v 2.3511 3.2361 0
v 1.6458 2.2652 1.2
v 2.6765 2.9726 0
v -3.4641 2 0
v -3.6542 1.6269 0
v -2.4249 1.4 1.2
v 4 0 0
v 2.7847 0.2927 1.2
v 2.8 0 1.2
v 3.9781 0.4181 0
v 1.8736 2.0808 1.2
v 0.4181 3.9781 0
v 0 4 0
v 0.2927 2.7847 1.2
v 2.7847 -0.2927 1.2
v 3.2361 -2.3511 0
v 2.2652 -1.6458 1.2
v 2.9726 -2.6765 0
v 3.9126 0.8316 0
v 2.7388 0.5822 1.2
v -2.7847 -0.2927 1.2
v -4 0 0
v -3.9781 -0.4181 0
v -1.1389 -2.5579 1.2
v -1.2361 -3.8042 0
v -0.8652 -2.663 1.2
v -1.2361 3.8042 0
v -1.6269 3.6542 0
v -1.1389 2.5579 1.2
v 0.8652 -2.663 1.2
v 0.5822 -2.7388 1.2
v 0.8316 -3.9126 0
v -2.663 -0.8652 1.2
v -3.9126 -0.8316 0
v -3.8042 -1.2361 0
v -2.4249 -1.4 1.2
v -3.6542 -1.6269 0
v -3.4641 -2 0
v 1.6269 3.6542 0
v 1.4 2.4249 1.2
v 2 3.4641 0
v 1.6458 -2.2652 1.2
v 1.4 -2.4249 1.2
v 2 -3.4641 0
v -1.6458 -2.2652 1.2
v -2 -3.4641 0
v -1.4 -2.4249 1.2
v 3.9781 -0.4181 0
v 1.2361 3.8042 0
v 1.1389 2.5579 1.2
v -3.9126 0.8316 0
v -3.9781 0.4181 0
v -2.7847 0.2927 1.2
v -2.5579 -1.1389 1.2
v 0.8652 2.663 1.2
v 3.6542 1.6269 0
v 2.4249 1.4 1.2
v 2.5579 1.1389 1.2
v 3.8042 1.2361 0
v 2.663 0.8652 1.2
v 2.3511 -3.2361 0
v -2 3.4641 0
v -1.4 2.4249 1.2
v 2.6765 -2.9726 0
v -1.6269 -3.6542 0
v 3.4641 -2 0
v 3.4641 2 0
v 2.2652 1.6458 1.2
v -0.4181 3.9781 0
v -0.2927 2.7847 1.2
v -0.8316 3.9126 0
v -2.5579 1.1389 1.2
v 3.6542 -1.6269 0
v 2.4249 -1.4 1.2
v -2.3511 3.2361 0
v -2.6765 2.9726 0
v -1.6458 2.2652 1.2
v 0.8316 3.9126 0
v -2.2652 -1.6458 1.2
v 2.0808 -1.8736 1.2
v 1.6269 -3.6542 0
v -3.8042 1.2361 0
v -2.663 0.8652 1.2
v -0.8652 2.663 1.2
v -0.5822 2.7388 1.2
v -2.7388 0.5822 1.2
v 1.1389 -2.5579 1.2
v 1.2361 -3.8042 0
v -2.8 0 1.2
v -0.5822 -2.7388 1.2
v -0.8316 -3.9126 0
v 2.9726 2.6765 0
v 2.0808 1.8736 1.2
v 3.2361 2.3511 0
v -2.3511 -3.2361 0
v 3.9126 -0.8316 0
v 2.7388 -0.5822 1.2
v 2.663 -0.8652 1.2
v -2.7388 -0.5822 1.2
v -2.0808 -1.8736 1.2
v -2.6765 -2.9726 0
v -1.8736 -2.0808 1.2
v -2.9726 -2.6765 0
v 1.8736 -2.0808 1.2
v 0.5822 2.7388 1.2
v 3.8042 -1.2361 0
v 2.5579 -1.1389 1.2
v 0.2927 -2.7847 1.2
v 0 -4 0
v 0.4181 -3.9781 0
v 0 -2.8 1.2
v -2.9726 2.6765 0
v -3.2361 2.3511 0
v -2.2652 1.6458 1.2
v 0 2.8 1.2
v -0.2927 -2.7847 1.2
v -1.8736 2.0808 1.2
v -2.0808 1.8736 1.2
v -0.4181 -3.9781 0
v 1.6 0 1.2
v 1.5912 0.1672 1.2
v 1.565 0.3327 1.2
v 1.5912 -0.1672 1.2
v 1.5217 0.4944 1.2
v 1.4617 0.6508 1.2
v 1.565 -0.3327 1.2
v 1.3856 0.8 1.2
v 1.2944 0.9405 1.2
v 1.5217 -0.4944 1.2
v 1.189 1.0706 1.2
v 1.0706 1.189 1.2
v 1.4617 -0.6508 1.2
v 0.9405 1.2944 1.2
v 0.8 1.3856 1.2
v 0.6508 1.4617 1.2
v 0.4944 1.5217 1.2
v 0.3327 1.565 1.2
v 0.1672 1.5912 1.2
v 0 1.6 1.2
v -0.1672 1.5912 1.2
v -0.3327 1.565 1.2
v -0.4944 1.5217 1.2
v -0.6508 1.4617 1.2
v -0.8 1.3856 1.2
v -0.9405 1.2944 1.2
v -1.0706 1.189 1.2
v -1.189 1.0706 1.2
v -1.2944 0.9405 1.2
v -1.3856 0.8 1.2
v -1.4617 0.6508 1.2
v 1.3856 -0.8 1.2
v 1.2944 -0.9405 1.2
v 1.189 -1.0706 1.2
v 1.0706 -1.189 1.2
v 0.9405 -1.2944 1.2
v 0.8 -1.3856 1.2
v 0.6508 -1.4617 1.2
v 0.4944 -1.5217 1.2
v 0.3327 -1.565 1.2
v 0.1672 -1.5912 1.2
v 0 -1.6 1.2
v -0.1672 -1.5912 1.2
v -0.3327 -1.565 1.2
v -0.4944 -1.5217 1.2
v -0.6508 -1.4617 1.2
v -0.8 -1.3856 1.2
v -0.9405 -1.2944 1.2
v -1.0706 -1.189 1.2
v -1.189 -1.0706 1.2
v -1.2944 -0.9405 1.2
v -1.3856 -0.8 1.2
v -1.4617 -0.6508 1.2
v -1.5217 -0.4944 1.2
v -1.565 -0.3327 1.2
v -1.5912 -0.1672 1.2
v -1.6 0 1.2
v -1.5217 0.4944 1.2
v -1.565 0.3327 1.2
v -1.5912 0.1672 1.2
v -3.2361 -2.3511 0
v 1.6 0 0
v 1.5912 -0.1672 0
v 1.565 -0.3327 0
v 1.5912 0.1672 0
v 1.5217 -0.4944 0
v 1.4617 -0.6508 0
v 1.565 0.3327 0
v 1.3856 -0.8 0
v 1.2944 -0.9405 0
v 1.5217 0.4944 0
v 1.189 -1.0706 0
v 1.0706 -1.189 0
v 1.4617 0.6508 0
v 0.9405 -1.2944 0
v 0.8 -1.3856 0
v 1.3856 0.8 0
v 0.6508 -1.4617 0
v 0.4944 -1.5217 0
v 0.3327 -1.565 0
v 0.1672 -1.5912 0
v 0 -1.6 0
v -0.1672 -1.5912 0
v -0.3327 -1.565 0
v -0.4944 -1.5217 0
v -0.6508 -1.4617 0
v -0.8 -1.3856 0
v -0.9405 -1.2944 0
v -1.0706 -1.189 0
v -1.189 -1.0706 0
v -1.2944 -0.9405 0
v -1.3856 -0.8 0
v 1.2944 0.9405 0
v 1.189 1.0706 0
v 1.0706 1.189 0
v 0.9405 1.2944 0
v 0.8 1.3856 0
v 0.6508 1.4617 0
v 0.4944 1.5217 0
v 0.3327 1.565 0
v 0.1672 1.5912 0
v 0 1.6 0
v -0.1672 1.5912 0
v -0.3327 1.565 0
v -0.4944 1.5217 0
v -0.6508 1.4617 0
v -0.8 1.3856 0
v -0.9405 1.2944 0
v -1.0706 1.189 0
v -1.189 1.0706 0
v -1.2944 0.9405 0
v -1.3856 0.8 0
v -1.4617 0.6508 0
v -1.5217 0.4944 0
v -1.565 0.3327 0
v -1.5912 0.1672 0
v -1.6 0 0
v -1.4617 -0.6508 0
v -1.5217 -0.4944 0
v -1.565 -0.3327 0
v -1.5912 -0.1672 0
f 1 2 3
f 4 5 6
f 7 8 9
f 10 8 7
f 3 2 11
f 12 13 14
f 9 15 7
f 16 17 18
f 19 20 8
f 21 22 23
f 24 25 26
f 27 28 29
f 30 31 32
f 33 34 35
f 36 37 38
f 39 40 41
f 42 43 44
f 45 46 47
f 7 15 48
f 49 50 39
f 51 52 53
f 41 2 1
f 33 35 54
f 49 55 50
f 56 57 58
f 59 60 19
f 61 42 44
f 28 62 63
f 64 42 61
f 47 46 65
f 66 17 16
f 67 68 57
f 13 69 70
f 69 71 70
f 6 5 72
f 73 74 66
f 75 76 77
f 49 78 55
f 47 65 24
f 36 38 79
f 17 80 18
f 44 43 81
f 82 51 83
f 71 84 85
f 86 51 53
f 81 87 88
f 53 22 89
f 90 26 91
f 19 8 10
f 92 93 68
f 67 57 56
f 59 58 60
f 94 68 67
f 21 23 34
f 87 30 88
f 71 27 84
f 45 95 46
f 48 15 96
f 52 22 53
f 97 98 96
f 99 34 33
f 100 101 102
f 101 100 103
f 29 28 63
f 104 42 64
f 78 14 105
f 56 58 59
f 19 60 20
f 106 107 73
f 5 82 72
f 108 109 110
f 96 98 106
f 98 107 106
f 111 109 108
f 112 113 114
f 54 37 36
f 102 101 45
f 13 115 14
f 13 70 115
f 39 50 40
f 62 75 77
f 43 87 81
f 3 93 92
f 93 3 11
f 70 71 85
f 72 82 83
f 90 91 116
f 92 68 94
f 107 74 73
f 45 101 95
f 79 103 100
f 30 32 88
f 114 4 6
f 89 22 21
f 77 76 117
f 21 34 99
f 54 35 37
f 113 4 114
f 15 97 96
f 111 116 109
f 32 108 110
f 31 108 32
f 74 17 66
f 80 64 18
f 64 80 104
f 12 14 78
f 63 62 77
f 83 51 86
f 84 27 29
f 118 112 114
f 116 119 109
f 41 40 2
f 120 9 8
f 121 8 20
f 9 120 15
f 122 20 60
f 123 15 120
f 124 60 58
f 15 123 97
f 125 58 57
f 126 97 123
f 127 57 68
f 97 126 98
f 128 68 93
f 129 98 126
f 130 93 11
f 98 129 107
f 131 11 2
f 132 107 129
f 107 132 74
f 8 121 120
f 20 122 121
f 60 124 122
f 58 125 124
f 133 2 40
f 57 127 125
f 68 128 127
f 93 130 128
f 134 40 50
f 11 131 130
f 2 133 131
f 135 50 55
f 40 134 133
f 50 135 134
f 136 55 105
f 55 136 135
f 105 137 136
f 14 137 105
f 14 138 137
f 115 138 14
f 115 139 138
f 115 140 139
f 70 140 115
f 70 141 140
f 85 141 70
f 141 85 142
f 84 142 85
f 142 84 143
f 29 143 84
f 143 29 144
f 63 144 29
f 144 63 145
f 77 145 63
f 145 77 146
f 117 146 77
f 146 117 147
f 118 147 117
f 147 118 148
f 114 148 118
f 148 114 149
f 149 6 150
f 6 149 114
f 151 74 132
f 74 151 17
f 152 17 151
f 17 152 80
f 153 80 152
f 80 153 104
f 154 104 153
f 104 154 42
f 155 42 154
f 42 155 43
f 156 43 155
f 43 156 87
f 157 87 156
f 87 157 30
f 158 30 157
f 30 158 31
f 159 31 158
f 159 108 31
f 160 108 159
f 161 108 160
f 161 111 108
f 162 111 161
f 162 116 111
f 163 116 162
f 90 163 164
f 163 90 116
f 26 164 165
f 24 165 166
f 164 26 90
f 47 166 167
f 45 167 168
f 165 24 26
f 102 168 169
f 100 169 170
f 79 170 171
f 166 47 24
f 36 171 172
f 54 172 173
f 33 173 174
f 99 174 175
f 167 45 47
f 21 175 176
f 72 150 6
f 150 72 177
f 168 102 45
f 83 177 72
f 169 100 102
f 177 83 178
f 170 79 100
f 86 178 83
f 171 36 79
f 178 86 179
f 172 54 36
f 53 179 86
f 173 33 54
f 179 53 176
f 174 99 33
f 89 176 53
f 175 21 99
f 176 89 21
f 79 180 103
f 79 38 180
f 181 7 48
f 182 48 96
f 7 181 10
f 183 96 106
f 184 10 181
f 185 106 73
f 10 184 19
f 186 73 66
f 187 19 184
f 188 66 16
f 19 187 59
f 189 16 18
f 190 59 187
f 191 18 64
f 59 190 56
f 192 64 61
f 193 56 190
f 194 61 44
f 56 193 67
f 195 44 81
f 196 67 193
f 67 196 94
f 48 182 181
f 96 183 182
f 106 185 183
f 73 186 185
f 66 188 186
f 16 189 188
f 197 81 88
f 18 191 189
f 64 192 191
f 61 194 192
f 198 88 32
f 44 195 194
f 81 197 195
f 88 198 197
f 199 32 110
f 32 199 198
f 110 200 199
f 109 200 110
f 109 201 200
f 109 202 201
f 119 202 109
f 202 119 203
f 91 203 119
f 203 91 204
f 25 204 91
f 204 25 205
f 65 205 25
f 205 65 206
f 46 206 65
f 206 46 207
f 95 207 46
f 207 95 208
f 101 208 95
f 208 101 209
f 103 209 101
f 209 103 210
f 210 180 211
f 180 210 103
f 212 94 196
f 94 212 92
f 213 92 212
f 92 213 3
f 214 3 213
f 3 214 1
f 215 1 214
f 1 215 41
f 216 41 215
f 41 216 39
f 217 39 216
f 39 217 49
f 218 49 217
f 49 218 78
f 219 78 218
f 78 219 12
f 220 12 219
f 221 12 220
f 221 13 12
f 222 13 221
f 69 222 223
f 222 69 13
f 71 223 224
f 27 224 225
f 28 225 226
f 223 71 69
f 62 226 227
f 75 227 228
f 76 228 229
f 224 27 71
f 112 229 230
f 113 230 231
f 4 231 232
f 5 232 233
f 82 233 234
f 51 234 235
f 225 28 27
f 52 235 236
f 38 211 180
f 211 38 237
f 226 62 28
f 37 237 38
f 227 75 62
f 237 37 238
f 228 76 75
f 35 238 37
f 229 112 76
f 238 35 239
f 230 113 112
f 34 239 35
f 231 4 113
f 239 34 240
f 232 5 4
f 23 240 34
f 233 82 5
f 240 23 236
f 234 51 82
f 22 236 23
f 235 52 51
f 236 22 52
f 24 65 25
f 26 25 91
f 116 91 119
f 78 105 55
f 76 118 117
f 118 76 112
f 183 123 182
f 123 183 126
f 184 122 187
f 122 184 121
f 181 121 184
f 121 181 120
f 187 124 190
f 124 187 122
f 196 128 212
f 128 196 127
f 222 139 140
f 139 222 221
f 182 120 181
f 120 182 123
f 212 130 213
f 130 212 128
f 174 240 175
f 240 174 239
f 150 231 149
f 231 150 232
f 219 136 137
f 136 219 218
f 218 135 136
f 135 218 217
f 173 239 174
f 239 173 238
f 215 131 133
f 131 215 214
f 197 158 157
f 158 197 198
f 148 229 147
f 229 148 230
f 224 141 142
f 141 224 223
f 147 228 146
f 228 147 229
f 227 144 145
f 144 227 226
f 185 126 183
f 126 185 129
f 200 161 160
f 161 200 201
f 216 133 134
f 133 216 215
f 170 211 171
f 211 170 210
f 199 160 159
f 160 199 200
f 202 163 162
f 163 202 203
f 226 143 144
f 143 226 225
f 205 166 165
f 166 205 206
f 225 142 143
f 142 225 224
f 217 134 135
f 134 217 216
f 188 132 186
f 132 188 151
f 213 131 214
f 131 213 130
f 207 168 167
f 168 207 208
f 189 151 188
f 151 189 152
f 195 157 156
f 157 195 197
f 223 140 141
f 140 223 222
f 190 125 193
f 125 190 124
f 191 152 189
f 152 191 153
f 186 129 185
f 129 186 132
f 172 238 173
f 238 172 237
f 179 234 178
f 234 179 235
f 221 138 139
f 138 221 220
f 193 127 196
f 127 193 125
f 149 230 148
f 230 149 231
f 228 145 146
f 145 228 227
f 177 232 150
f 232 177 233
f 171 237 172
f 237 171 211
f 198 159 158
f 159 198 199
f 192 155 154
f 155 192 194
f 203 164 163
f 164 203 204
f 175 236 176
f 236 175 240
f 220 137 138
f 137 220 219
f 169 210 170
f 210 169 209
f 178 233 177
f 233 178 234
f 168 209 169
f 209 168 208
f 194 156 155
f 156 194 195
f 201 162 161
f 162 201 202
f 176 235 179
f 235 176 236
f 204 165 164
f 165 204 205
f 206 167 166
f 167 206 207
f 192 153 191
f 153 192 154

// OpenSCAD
// Conical spring washer.
$fn = 60;
eps = 0.02;
inner_d = 3.2;
outer_d = 8;
thickness = 1.2;
difference() {
    cylinder(d1=outer_d,d2=outer_d-2*thickness,h=thickness);
    translate([0,0,-eps]) cylinder(d=inner_d,h=thickness+2*eps);
}
